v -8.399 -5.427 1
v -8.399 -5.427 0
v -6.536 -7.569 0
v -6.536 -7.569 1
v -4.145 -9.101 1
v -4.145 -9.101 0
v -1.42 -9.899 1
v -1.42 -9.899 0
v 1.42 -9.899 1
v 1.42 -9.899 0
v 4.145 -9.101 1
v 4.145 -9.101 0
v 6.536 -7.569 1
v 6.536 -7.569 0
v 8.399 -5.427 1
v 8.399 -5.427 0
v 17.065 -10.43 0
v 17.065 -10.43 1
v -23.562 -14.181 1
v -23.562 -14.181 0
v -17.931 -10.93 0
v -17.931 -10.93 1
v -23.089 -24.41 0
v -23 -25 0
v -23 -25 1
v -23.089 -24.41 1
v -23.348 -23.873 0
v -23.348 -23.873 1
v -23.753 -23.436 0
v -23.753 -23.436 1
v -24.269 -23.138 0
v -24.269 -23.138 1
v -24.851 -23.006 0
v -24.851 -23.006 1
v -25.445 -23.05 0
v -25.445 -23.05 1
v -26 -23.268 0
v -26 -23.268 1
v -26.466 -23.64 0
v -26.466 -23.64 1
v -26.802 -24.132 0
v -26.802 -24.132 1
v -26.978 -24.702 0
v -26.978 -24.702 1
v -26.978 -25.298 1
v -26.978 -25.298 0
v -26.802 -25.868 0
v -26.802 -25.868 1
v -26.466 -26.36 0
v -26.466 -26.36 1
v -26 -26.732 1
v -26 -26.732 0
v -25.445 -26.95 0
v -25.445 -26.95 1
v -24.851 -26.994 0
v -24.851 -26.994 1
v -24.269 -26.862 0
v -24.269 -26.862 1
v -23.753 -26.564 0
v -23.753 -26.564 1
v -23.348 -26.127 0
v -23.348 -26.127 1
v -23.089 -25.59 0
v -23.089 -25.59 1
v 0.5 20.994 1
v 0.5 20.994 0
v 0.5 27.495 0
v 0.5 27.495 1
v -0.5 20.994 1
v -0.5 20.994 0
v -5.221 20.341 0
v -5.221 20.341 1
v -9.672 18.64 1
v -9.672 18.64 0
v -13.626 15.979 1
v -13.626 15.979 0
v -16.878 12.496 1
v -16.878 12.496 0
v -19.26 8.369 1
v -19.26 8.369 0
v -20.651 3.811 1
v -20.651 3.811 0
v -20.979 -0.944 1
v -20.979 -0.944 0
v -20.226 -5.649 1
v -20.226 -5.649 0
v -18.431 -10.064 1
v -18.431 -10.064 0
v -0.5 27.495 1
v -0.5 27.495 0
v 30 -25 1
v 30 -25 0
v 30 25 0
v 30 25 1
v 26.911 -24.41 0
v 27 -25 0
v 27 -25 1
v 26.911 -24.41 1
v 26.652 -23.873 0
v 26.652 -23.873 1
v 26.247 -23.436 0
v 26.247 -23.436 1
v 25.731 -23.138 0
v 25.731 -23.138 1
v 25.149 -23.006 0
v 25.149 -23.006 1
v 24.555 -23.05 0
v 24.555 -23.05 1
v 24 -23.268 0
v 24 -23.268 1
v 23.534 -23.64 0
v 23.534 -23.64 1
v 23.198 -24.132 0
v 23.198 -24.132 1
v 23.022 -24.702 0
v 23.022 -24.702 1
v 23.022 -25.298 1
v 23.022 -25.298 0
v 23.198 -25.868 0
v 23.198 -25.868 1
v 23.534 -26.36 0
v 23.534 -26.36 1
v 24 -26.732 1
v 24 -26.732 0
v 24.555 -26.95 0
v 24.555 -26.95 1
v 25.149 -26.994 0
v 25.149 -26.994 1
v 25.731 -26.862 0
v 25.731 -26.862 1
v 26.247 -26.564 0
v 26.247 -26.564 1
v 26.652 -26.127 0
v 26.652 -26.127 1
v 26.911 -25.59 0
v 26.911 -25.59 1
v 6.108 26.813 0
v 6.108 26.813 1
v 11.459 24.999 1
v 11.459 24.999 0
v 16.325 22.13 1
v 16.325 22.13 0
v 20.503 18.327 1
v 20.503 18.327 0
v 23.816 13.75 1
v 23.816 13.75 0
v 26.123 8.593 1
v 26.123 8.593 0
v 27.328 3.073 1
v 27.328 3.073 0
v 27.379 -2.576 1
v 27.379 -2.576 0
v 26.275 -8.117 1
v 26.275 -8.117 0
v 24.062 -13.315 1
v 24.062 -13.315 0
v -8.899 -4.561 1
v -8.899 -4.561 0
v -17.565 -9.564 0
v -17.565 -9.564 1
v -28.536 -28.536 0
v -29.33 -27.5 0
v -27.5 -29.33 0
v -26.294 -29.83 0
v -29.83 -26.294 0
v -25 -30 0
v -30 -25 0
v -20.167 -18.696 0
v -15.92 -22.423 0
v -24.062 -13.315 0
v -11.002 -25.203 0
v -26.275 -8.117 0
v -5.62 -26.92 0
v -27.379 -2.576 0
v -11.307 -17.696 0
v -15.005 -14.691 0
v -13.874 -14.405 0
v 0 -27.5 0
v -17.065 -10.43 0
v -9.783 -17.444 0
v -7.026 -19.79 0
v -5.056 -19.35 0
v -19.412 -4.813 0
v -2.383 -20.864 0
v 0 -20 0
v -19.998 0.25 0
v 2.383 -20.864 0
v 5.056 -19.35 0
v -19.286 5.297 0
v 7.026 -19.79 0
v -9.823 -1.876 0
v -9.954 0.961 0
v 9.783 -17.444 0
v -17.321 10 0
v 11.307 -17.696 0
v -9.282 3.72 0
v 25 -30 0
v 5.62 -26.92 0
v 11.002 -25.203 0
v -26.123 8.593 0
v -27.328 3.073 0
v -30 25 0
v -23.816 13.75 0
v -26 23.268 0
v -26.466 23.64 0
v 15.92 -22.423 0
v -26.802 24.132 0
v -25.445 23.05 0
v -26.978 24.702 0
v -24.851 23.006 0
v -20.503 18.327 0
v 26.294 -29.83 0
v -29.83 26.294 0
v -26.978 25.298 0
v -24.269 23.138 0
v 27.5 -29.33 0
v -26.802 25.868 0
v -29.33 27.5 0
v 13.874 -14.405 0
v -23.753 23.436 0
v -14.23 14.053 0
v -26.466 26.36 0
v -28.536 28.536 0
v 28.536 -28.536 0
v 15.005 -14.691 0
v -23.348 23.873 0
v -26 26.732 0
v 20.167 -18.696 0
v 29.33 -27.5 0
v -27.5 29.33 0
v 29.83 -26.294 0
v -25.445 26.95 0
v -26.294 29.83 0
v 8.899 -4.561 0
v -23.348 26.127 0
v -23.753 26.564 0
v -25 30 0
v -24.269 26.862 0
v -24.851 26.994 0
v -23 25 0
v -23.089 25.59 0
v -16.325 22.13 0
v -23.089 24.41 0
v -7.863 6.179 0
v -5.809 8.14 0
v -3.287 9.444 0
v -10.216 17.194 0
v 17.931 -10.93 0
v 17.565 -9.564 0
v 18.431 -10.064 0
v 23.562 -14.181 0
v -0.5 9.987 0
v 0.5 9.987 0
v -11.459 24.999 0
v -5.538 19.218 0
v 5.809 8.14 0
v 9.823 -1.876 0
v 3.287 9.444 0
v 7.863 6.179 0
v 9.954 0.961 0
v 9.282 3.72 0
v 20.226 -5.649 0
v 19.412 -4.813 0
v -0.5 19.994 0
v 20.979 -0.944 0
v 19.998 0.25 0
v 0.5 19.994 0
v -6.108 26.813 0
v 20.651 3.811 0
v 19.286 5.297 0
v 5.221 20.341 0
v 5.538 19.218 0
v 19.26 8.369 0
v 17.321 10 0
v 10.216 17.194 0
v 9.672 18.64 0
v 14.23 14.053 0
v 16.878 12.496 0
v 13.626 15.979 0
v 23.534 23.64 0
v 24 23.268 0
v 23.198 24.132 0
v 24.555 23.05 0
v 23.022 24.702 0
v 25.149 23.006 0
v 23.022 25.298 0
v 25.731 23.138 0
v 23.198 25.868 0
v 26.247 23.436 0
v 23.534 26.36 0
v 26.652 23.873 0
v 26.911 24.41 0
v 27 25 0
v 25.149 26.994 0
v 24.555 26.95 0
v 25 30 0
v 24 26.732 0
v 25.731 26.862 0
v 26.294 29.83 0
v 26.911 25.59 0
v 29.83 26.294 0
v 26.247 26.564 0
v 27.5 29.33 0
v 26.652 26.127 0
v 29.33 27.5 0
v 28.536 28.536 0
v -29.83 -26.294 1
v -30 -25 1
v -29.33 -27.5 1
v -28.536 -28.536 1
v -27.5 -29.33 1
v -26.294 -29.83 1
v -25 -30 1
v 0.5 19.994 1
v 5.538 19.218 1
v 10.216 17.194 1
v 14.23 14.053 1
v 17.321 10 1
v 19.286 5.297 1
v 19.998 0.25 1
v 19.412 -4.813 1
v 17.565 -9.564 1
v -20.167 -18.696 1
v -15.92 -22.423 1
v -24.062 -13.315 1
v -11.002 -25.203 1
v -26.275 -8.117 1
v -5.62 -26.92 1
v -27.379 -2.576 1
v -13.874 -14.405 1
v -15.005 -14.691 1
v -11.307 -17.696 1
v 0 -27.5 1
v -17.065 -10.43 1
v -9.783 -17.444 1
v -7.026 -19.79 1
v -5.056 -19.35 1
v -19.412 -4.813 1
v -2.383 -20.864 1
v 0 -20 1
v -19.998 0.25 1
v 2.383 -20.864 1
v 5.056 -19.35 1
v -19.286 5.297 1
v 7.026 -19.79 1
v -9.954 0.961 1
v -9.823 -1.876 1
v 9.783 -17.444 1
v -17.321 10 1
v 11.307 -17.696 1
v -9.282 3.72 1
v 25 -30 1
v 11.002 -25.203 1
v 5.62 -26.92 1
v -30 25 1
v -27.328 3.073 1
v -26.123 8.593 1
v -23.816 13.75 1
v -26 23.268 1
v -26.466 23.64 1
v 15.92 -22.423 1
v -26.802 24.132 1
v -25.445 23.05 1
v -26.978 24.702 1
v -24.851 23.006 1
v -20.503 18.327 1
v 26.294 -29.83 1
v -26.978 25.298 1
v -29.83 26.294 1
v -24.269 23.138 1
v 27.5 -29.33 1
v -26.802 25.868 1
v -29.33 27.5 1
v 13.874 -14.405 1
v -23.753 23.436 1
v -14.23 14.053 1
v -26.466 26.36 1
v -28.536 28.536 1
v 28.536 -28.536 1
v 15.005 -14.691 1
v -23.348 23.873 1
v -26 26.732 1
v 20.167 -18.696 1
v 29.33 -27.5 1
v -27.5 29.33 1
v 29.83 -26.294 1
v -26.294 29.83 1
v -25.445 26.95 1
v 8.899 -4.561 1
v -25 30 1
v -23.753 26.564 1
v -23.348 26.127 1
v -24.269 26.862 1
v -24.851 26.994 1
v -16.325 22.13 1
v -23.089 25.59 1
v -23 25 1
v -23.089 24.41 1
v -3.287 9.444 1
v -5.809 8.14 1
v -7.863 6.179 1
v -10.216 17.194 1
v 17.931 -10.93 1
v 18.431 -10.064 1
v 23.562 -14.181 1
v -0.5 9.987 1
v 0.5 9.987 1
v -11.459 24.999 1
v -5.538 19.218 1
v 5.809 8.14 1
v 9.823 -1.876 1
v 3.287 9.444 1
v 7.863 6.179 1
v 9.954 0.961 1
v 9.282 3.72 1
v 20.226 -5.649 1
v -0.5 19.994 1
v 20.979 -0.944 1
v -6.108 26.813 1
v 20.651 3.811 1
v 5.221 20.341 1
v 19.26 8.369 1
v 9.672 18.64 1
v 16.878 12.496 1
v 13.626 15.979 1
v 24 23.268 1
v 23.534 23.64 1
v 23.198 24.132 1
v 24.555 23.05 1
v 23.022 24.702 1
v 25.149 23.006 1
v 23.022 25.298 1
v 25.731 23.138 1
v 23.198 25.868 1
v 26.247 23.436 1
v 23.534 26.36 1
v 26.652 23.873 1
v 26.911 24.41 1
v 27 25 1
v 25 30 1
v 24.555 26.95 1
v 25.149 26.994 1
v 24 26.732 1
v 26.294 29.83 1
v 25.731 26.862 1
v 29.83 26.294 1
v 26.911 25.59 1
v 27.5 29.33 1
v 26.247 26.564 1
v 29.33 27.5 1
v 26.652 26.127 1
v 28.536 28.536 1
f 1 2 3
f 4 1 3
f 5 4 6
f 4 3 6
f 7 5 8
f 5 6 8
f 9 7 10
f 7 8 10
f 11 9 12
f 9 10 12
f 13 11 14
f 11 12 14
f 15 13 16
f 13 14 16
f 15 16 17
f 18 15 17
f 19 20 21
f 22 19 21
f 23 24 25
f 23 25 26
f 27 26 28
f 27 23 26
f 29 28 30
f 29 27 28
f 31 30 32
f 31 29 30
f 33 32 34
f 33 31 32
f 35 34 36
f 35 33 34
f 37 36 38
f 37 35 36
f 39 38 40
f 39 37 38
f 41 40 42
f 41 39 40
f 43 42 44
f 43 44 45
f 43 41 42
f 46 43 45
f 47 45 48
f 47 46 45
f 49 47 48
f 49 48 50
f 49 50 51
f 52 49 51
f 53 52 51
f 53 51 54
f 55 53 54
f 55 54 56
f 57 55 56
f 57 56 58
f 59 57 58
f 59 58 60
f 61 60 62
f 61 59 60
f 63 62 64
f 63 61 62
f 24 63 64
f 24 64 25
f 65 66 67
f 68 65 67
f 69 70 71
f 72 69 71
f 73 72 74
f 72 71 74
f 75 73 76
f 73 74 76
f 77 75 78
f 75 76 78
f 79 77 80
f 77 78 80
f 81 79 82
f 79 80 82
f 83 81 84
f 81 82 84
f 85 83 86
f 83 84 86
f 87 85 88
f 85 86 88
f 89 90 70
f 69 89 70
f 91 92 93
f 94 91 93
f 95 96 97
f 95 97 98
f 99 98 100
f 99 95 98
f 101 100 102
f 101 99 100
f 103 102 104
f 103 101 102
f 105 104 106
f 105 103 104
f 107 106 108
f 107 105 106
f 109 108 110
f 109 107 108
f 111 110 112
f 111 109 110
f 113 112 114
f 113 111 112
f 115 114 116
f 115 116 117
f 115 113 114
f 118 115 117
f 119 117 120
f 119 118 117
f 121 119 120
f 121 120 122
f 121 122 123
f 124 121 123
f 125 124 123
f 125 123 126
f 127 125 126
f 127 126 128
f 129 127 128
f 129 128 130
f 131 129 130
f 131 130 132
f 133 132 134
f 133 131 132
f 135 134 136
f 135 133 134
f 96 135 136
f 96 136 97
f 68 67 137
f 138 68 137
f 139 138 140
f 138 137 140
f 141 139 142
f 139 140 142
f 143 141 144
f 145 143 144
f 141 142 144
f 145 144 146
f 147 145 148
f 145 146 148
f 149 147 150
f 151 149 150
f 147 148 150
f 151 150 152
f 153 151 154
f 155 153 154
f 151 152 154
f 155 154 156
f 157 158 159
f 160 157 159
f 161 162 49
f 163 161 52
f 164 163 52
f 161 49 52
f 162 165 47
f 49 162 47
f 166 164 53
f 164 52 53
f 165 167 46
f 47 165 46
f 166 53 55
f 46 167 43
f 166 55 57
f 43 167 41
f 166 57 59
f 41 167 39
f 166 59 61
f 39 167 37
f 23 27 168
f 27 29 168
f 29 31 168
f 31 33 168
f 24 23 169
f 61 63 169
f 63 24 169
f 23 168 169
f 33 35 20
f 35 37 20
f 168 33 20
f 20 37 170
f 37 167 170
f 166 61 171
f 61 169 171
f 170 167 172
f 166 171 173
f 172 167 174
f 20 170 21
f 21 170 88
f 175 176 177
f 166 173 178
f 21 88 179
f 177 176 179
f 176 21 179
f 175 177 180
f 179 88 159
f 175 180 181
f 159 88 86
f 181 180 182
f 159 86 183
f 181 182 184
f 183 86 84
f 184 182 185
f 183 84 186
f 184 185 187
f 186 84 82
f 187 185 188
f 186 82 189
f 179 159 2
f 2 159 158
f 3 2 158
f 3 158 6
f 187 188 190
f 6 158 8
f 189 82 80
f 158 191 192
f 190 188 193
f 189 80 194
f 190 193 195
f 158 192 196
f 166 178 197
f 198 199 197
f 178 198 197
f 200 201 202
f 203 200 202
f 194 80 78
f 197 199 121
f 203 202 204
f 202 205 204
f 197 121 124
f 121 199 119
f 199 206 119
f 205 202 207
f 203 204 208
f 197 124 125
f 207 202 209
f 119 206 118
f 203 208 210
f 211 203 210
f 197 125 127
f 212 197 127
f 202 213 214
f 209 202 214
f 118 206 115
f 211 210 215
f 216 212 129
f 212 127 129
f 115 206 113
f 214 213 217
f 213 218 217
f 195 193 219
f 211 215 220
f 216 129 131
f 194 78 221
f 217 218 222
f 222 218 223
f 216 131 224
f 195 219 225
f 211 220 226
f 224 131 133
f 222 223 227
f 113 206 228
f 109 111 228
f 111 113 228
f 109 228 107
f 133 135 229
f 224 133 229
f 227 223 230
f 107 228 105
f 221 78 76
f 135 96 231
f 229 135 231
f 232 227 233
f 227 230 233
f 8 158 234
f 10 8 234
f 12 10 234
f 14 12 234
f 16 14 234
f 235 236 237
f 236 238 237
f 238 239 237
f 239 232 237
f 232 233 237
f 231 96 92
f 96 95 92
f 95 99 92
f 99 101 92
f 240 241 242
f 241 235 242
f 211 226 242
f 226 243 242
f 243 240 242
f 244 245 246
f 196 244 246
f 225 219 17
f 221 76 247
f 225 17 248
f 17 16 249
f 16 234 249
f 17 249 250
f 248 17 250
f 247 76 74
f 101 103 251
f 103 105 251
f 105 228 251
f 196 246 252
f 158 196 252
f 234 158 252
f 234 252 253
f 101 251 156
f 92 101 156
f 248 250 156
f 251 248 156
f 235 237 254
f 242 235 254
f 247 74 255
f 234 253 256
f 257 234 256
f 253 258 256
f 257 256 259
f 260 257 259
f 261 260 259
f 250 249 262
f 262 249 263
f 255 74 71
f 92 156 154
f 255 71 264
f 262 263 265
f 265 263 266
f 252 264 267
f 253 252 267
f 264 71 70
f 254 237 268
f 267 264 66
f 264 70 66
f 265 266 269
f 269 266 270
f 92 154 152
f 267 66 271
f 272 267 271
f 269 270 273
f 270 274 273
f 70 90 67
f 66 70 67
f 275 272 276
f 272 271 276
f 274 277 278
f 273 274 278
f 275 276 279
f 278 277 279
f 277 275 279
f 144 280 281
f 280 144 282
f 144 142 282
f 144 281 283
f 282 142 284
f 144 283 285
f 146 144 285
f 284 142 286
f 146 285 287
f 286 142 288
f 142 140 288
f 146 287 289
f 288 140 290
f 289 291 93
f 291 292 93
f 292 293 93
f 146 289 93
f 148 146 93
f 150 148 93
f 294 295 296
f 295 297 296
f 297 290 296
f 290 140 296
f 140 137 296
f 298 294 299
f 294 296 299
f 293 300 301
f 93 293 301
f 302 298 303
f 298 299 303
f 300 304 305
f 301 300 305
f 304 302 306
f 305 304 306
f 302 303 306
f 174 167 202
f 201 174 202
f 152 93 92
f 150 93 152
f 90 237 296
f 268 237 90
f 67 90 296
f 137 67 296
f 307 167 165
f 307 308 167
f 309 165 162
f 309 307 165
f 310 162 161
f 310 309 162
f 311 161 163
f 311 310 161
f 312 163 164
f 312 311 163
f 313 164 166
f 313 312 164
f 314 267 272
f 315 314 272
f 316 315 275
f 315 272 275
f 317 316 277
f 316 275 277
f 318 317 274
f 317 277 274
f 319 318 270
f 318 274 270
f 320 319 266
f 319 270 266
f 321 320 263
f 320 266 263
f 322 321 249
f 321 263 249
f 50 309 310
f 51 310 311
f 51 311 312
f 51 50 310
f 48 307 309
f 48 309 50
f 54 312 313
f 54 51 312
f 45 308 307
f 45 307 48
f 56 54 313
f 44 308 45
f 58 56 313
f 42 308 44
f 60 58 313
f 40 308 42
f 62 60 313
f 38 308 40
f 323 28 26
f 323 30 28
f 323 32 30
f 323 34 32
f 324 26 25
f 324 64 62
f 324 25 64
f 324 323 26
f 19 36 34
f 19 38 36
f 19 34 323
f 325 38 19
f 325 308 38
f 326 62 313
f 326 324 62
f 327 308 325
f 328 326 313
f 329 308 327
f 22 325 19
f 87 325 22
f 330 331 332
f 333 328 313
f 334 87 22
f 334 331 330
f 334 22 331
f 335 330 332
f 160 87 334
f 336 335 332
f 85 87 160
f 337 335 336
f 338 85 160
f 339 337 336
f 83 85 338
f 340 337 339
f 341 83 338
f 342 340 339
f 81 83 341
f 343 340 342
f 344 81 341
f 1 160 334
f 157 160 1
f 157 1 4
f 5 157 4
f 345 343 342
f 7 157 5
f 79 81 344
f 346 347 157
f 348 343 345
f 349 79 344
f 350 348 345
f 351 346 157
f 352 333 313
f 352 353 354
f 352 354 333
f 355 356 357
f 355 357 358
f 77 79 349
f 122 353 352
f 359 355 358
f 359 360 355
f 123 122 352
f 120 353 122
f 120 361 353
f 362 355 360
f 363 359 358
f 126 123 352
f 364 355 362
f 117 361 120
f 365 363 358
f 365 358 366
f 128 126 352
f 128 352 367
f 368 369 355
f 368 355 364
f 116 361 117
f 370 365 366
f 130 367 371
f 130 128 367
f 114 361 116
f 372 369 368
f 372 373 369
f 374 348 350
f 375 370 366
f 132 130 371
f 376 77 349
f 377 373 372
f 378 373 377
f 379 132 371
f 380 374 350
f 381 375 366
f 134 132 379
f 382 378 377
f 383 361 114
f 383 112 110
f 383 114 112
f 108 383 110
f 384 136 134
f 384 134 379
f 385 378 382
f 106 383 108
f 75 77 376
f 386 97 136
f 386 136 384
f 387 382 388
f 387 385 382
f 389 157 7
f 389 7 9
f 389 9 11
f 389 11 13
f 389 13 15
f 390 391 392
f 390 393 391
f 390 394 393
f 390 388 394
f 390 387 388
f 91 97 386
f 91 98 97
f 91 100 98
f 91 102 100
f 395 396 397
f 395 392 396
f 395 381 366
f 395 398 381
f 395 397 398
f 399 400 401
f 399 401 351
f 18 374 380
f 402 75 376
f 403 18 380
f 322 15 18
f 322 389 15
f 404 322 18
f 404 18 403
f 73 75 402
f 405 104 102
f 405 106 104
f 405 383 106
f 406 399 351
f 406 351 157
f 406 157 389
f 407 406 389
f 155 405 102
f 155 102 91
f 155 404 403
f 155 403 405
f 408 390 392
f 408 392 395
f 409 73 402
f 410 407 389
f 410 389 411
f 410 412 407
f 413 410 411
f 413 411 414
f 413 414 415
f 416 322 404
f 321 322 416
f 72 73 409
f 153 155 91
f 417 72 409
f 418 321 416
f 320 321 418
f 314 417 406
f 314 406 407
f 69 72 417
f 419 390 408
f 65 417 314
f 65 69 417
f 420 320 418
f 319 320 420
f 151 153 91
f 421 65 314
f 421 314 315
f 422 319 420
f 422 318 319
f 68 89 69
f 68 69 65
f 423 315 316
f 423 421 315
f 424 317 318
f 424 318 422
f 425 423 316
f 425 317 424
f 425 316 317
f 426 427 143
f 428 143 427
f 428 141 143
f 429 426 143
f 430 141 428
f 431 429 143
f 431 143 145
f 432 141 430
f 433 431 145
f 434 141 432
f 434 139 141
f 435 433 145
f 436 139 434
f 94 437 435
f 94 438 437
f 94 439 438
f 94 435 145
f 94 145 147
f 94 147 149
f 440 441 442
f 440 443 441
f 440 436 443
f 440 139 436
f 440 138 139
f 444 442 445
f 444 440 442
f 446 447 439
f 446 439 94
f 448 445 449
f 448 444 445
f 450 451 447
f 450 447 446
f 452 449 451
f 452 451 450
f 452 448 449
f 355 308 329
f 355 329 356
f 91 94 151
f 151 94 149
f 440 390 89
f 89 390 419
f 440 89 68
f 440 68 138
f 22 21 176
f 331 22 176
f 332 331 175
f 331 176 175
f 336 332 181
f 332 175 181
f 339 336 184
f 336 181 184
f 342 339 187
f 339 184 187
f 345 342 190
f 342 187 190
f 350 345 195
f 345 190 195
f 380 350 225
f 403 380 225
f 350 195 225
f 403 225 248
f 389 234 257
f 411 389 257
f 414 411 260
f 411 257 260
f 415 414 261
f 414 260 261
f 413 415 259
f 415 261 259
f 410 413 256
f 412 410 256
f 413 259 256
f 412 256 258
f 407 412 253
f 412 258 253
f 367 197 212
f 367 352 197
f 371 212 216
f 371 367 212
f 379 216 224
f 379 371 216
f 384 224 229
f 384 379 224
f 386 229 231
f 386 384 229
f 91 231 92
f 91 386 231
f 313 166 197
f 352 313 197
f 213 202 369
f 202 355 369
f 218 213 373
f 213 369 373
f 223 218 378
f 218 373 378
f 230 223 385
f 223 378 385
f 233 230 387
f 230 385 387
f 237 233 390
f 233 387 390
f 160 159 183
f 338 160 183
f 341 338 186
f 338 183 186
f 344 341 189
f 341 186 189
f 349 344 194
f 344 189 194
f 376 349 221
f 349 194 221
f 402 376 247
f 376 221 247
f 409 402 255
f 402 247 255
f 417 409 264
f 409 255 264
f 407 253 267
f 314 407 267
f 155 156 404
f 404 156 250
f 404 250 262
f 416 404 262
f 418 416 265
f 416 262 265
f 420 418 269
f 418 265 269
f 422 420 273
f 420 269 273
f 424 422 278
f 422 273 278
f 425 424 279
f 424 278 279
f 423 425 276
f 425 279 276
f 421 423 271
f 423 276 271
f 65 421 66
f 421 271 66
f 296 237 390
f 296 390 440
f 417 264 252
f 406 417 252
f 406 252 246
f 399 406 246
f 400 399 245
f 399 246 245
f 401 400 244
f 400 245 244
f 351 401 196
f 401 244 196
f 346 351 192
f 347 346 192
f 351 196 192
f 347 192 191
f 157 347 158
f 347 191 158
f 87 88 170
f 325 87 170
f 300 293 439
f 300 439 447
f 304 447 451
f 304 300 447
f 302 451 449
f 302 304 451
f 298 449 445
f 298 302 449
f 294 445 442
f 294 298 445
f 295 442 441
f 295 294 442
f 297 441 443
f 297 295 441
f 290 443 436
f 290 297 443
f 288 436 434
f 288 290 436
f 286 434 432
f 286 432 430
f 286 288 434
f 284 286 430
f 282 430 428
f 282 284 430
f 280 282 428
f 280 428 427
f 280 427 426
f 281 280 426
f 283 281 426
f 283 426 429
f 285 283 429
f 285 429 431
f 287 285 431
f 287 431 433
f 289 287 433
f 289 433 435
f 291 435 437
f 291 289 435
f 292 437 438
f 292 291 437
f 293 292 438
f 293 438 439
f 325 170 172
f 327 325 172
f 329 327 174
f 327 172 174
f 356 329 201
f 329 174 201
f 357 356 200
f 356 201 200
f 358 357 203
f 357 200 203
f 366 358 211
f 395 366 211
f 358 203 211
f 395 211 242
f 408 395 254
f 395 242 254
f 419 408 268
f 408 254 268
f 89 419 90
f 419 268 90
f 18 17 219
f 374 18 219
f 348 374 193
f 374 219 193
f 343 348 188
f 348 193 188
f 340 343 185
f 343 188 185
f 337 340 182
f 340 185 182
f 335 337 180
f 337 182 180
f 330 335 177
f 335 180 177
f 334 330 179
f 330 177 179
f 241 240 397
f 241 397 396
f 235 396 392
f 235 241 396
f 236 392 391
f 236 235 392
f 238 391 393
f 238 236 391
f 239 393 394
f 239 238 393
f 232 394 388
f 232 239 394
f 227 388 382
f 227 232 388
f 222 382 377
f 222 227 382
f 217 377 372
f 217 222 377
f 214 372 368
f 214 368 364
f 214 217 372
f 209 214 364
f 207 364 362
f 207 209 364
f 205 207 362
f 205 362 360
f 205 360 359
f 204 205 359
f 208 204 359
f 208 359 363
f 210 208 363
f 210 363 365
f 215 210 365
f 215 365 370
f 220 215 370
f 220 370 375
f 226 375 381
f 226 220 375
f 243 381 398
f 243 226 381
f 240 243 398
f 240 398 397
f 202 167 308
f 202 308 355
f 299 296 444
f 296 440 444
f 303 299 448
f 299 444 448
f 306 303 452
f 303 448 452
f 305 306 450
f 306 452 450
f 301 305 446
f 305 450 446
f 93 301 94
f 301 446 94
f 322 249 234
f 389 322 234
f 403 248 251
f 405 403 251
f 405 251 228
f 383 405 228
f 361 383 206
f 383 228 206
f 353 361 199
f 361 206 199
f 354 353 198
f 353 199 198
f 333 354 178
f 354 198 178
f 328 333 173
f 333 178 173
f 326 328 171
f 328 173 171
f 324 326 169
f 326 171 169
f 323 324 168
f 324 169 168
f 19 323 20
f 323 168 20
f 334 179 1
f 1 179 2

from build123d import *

# Parameters (mm, degrees)
F0_W     = 60
F0_H     = 60
F0_R     = 2
F1_DEPTH = 1
F2_R     = 5


with BuildPart() as f1:
    # F0 (on Top) → F1 (new body)
    with BuildSketch(Plane.XY):
        Rectangle(F0_W, F0_H)
        with Locations((-25, -25)):
            Circle(F0_R, mode=Mode.SUBTRACT)
        with BuildLine():
            Line((-23.561762, -14.18074), (-17.931378, -10.930036))
            ThreePointArc((-17.931378, -10.930036), (0, -21), (17.931378, -10.930036))
            Line((17.931378, -10.930036), (23.561762, -14.18074))
            ThreePointArc((23.561762, -14.18074), (0, -27.5), (-23.561762, -14.18074))
        make_face(mode=Mode.SUBTRACT)
        with Locations((25, -25)):
            Circle(F0_R, mode=Mode.SUBTRACT)
        with BuildLine():
            ThreePointArc((17.065095, -10.429887), (0, -20), (-17.065095, -10.429887))
            Line((-17.065095, -10.429887), (-8.399422, -5.426759))
            ThreePointArc((-8.399422, -5.426759), (0, -10), (8.399422, -5.426759))
            Line((8.399422, -5.426759), (17.065095, -10.429887))
        make_face(mode=Mode.SUBTRACT)
        with BuildLine():
            ThreePointArc((-24.061762, -13.314714), (-23.815699, 13.75), (-0.5, 27.495454))
            Line((-0.5, 27.495454), (-0.5, 20.994047))
            ThreePointArc((-0.5, 20.994047), (-18.186533, 10.5), (-18.431378, -10.064011))
            Line((-18.431378, -10.064011), (-24.061762, -13.314714))
        make_face(mode=Mode.SUBTRACT)
        with BuildLine():
            Line((-0.5, 19.993749), (-0.5, 9.987492))
            ThreePointArc((-0.5, 9.987492), (-8.660254, 5), (-8.899422, -4.560733))
            Line((-8.899422, -4.560733), (-17.565095, -9.563862))
            ThreePointArc((-17.565095, -9.563862), (-17.320508, 10), (-0.5, 19.993749))
        make_face(mode=Mode.SUBTRACT)
        with Locations((-25, 25)):
            Circle(F0_R, mode=Mode.SUBTRACT)
        with BuildLine():
            Line((17.565095, -9.563862), (8.899422, -4.560733))
            ThreePointArc((8.899422, -4.560733), (8.660254, 5), (0.5, 9.987492))
            Line((0.5, 9.987492), (0.5, 19.993749))
            ThreePointArc((0.5, 19.993749), (17.320508, 10), (17.565095, -9.563862))
        make_face(mode=Mode.SUBTRACT)
        with BuildLine():
            Line((24.061762, -13.314714), (18.431378, -10.064011))
            ThreePointArc((18.431378, -10.064011), (18.186533, 10.5), (0.5, 20.994047))
            Line((0.5, 20.994047), (0.5, 27.495454))
            ThreePointArc((0.5, 27.495454), (23.815699, 13.75), (24.061762, -13.314714))
        make_face(mode=Mode.SUBTRACT)
        with Locations((25, 25)):
            Circle(F0_R, mode=Mode.SUBTRACT)
    extrude(amount=F1_DEPTH)

    # F2
    f2_edges = [f1.edges().sort_by_distance(p)[0] for p in [
        (-30, -30, 0.5),
        (30, -30, 0.5),
        (-30, 30, 0.5),
        (30, 30, 0.5),
    ]]
    fillet(f2_edges, radius=F2_R)


solid = f1.part
